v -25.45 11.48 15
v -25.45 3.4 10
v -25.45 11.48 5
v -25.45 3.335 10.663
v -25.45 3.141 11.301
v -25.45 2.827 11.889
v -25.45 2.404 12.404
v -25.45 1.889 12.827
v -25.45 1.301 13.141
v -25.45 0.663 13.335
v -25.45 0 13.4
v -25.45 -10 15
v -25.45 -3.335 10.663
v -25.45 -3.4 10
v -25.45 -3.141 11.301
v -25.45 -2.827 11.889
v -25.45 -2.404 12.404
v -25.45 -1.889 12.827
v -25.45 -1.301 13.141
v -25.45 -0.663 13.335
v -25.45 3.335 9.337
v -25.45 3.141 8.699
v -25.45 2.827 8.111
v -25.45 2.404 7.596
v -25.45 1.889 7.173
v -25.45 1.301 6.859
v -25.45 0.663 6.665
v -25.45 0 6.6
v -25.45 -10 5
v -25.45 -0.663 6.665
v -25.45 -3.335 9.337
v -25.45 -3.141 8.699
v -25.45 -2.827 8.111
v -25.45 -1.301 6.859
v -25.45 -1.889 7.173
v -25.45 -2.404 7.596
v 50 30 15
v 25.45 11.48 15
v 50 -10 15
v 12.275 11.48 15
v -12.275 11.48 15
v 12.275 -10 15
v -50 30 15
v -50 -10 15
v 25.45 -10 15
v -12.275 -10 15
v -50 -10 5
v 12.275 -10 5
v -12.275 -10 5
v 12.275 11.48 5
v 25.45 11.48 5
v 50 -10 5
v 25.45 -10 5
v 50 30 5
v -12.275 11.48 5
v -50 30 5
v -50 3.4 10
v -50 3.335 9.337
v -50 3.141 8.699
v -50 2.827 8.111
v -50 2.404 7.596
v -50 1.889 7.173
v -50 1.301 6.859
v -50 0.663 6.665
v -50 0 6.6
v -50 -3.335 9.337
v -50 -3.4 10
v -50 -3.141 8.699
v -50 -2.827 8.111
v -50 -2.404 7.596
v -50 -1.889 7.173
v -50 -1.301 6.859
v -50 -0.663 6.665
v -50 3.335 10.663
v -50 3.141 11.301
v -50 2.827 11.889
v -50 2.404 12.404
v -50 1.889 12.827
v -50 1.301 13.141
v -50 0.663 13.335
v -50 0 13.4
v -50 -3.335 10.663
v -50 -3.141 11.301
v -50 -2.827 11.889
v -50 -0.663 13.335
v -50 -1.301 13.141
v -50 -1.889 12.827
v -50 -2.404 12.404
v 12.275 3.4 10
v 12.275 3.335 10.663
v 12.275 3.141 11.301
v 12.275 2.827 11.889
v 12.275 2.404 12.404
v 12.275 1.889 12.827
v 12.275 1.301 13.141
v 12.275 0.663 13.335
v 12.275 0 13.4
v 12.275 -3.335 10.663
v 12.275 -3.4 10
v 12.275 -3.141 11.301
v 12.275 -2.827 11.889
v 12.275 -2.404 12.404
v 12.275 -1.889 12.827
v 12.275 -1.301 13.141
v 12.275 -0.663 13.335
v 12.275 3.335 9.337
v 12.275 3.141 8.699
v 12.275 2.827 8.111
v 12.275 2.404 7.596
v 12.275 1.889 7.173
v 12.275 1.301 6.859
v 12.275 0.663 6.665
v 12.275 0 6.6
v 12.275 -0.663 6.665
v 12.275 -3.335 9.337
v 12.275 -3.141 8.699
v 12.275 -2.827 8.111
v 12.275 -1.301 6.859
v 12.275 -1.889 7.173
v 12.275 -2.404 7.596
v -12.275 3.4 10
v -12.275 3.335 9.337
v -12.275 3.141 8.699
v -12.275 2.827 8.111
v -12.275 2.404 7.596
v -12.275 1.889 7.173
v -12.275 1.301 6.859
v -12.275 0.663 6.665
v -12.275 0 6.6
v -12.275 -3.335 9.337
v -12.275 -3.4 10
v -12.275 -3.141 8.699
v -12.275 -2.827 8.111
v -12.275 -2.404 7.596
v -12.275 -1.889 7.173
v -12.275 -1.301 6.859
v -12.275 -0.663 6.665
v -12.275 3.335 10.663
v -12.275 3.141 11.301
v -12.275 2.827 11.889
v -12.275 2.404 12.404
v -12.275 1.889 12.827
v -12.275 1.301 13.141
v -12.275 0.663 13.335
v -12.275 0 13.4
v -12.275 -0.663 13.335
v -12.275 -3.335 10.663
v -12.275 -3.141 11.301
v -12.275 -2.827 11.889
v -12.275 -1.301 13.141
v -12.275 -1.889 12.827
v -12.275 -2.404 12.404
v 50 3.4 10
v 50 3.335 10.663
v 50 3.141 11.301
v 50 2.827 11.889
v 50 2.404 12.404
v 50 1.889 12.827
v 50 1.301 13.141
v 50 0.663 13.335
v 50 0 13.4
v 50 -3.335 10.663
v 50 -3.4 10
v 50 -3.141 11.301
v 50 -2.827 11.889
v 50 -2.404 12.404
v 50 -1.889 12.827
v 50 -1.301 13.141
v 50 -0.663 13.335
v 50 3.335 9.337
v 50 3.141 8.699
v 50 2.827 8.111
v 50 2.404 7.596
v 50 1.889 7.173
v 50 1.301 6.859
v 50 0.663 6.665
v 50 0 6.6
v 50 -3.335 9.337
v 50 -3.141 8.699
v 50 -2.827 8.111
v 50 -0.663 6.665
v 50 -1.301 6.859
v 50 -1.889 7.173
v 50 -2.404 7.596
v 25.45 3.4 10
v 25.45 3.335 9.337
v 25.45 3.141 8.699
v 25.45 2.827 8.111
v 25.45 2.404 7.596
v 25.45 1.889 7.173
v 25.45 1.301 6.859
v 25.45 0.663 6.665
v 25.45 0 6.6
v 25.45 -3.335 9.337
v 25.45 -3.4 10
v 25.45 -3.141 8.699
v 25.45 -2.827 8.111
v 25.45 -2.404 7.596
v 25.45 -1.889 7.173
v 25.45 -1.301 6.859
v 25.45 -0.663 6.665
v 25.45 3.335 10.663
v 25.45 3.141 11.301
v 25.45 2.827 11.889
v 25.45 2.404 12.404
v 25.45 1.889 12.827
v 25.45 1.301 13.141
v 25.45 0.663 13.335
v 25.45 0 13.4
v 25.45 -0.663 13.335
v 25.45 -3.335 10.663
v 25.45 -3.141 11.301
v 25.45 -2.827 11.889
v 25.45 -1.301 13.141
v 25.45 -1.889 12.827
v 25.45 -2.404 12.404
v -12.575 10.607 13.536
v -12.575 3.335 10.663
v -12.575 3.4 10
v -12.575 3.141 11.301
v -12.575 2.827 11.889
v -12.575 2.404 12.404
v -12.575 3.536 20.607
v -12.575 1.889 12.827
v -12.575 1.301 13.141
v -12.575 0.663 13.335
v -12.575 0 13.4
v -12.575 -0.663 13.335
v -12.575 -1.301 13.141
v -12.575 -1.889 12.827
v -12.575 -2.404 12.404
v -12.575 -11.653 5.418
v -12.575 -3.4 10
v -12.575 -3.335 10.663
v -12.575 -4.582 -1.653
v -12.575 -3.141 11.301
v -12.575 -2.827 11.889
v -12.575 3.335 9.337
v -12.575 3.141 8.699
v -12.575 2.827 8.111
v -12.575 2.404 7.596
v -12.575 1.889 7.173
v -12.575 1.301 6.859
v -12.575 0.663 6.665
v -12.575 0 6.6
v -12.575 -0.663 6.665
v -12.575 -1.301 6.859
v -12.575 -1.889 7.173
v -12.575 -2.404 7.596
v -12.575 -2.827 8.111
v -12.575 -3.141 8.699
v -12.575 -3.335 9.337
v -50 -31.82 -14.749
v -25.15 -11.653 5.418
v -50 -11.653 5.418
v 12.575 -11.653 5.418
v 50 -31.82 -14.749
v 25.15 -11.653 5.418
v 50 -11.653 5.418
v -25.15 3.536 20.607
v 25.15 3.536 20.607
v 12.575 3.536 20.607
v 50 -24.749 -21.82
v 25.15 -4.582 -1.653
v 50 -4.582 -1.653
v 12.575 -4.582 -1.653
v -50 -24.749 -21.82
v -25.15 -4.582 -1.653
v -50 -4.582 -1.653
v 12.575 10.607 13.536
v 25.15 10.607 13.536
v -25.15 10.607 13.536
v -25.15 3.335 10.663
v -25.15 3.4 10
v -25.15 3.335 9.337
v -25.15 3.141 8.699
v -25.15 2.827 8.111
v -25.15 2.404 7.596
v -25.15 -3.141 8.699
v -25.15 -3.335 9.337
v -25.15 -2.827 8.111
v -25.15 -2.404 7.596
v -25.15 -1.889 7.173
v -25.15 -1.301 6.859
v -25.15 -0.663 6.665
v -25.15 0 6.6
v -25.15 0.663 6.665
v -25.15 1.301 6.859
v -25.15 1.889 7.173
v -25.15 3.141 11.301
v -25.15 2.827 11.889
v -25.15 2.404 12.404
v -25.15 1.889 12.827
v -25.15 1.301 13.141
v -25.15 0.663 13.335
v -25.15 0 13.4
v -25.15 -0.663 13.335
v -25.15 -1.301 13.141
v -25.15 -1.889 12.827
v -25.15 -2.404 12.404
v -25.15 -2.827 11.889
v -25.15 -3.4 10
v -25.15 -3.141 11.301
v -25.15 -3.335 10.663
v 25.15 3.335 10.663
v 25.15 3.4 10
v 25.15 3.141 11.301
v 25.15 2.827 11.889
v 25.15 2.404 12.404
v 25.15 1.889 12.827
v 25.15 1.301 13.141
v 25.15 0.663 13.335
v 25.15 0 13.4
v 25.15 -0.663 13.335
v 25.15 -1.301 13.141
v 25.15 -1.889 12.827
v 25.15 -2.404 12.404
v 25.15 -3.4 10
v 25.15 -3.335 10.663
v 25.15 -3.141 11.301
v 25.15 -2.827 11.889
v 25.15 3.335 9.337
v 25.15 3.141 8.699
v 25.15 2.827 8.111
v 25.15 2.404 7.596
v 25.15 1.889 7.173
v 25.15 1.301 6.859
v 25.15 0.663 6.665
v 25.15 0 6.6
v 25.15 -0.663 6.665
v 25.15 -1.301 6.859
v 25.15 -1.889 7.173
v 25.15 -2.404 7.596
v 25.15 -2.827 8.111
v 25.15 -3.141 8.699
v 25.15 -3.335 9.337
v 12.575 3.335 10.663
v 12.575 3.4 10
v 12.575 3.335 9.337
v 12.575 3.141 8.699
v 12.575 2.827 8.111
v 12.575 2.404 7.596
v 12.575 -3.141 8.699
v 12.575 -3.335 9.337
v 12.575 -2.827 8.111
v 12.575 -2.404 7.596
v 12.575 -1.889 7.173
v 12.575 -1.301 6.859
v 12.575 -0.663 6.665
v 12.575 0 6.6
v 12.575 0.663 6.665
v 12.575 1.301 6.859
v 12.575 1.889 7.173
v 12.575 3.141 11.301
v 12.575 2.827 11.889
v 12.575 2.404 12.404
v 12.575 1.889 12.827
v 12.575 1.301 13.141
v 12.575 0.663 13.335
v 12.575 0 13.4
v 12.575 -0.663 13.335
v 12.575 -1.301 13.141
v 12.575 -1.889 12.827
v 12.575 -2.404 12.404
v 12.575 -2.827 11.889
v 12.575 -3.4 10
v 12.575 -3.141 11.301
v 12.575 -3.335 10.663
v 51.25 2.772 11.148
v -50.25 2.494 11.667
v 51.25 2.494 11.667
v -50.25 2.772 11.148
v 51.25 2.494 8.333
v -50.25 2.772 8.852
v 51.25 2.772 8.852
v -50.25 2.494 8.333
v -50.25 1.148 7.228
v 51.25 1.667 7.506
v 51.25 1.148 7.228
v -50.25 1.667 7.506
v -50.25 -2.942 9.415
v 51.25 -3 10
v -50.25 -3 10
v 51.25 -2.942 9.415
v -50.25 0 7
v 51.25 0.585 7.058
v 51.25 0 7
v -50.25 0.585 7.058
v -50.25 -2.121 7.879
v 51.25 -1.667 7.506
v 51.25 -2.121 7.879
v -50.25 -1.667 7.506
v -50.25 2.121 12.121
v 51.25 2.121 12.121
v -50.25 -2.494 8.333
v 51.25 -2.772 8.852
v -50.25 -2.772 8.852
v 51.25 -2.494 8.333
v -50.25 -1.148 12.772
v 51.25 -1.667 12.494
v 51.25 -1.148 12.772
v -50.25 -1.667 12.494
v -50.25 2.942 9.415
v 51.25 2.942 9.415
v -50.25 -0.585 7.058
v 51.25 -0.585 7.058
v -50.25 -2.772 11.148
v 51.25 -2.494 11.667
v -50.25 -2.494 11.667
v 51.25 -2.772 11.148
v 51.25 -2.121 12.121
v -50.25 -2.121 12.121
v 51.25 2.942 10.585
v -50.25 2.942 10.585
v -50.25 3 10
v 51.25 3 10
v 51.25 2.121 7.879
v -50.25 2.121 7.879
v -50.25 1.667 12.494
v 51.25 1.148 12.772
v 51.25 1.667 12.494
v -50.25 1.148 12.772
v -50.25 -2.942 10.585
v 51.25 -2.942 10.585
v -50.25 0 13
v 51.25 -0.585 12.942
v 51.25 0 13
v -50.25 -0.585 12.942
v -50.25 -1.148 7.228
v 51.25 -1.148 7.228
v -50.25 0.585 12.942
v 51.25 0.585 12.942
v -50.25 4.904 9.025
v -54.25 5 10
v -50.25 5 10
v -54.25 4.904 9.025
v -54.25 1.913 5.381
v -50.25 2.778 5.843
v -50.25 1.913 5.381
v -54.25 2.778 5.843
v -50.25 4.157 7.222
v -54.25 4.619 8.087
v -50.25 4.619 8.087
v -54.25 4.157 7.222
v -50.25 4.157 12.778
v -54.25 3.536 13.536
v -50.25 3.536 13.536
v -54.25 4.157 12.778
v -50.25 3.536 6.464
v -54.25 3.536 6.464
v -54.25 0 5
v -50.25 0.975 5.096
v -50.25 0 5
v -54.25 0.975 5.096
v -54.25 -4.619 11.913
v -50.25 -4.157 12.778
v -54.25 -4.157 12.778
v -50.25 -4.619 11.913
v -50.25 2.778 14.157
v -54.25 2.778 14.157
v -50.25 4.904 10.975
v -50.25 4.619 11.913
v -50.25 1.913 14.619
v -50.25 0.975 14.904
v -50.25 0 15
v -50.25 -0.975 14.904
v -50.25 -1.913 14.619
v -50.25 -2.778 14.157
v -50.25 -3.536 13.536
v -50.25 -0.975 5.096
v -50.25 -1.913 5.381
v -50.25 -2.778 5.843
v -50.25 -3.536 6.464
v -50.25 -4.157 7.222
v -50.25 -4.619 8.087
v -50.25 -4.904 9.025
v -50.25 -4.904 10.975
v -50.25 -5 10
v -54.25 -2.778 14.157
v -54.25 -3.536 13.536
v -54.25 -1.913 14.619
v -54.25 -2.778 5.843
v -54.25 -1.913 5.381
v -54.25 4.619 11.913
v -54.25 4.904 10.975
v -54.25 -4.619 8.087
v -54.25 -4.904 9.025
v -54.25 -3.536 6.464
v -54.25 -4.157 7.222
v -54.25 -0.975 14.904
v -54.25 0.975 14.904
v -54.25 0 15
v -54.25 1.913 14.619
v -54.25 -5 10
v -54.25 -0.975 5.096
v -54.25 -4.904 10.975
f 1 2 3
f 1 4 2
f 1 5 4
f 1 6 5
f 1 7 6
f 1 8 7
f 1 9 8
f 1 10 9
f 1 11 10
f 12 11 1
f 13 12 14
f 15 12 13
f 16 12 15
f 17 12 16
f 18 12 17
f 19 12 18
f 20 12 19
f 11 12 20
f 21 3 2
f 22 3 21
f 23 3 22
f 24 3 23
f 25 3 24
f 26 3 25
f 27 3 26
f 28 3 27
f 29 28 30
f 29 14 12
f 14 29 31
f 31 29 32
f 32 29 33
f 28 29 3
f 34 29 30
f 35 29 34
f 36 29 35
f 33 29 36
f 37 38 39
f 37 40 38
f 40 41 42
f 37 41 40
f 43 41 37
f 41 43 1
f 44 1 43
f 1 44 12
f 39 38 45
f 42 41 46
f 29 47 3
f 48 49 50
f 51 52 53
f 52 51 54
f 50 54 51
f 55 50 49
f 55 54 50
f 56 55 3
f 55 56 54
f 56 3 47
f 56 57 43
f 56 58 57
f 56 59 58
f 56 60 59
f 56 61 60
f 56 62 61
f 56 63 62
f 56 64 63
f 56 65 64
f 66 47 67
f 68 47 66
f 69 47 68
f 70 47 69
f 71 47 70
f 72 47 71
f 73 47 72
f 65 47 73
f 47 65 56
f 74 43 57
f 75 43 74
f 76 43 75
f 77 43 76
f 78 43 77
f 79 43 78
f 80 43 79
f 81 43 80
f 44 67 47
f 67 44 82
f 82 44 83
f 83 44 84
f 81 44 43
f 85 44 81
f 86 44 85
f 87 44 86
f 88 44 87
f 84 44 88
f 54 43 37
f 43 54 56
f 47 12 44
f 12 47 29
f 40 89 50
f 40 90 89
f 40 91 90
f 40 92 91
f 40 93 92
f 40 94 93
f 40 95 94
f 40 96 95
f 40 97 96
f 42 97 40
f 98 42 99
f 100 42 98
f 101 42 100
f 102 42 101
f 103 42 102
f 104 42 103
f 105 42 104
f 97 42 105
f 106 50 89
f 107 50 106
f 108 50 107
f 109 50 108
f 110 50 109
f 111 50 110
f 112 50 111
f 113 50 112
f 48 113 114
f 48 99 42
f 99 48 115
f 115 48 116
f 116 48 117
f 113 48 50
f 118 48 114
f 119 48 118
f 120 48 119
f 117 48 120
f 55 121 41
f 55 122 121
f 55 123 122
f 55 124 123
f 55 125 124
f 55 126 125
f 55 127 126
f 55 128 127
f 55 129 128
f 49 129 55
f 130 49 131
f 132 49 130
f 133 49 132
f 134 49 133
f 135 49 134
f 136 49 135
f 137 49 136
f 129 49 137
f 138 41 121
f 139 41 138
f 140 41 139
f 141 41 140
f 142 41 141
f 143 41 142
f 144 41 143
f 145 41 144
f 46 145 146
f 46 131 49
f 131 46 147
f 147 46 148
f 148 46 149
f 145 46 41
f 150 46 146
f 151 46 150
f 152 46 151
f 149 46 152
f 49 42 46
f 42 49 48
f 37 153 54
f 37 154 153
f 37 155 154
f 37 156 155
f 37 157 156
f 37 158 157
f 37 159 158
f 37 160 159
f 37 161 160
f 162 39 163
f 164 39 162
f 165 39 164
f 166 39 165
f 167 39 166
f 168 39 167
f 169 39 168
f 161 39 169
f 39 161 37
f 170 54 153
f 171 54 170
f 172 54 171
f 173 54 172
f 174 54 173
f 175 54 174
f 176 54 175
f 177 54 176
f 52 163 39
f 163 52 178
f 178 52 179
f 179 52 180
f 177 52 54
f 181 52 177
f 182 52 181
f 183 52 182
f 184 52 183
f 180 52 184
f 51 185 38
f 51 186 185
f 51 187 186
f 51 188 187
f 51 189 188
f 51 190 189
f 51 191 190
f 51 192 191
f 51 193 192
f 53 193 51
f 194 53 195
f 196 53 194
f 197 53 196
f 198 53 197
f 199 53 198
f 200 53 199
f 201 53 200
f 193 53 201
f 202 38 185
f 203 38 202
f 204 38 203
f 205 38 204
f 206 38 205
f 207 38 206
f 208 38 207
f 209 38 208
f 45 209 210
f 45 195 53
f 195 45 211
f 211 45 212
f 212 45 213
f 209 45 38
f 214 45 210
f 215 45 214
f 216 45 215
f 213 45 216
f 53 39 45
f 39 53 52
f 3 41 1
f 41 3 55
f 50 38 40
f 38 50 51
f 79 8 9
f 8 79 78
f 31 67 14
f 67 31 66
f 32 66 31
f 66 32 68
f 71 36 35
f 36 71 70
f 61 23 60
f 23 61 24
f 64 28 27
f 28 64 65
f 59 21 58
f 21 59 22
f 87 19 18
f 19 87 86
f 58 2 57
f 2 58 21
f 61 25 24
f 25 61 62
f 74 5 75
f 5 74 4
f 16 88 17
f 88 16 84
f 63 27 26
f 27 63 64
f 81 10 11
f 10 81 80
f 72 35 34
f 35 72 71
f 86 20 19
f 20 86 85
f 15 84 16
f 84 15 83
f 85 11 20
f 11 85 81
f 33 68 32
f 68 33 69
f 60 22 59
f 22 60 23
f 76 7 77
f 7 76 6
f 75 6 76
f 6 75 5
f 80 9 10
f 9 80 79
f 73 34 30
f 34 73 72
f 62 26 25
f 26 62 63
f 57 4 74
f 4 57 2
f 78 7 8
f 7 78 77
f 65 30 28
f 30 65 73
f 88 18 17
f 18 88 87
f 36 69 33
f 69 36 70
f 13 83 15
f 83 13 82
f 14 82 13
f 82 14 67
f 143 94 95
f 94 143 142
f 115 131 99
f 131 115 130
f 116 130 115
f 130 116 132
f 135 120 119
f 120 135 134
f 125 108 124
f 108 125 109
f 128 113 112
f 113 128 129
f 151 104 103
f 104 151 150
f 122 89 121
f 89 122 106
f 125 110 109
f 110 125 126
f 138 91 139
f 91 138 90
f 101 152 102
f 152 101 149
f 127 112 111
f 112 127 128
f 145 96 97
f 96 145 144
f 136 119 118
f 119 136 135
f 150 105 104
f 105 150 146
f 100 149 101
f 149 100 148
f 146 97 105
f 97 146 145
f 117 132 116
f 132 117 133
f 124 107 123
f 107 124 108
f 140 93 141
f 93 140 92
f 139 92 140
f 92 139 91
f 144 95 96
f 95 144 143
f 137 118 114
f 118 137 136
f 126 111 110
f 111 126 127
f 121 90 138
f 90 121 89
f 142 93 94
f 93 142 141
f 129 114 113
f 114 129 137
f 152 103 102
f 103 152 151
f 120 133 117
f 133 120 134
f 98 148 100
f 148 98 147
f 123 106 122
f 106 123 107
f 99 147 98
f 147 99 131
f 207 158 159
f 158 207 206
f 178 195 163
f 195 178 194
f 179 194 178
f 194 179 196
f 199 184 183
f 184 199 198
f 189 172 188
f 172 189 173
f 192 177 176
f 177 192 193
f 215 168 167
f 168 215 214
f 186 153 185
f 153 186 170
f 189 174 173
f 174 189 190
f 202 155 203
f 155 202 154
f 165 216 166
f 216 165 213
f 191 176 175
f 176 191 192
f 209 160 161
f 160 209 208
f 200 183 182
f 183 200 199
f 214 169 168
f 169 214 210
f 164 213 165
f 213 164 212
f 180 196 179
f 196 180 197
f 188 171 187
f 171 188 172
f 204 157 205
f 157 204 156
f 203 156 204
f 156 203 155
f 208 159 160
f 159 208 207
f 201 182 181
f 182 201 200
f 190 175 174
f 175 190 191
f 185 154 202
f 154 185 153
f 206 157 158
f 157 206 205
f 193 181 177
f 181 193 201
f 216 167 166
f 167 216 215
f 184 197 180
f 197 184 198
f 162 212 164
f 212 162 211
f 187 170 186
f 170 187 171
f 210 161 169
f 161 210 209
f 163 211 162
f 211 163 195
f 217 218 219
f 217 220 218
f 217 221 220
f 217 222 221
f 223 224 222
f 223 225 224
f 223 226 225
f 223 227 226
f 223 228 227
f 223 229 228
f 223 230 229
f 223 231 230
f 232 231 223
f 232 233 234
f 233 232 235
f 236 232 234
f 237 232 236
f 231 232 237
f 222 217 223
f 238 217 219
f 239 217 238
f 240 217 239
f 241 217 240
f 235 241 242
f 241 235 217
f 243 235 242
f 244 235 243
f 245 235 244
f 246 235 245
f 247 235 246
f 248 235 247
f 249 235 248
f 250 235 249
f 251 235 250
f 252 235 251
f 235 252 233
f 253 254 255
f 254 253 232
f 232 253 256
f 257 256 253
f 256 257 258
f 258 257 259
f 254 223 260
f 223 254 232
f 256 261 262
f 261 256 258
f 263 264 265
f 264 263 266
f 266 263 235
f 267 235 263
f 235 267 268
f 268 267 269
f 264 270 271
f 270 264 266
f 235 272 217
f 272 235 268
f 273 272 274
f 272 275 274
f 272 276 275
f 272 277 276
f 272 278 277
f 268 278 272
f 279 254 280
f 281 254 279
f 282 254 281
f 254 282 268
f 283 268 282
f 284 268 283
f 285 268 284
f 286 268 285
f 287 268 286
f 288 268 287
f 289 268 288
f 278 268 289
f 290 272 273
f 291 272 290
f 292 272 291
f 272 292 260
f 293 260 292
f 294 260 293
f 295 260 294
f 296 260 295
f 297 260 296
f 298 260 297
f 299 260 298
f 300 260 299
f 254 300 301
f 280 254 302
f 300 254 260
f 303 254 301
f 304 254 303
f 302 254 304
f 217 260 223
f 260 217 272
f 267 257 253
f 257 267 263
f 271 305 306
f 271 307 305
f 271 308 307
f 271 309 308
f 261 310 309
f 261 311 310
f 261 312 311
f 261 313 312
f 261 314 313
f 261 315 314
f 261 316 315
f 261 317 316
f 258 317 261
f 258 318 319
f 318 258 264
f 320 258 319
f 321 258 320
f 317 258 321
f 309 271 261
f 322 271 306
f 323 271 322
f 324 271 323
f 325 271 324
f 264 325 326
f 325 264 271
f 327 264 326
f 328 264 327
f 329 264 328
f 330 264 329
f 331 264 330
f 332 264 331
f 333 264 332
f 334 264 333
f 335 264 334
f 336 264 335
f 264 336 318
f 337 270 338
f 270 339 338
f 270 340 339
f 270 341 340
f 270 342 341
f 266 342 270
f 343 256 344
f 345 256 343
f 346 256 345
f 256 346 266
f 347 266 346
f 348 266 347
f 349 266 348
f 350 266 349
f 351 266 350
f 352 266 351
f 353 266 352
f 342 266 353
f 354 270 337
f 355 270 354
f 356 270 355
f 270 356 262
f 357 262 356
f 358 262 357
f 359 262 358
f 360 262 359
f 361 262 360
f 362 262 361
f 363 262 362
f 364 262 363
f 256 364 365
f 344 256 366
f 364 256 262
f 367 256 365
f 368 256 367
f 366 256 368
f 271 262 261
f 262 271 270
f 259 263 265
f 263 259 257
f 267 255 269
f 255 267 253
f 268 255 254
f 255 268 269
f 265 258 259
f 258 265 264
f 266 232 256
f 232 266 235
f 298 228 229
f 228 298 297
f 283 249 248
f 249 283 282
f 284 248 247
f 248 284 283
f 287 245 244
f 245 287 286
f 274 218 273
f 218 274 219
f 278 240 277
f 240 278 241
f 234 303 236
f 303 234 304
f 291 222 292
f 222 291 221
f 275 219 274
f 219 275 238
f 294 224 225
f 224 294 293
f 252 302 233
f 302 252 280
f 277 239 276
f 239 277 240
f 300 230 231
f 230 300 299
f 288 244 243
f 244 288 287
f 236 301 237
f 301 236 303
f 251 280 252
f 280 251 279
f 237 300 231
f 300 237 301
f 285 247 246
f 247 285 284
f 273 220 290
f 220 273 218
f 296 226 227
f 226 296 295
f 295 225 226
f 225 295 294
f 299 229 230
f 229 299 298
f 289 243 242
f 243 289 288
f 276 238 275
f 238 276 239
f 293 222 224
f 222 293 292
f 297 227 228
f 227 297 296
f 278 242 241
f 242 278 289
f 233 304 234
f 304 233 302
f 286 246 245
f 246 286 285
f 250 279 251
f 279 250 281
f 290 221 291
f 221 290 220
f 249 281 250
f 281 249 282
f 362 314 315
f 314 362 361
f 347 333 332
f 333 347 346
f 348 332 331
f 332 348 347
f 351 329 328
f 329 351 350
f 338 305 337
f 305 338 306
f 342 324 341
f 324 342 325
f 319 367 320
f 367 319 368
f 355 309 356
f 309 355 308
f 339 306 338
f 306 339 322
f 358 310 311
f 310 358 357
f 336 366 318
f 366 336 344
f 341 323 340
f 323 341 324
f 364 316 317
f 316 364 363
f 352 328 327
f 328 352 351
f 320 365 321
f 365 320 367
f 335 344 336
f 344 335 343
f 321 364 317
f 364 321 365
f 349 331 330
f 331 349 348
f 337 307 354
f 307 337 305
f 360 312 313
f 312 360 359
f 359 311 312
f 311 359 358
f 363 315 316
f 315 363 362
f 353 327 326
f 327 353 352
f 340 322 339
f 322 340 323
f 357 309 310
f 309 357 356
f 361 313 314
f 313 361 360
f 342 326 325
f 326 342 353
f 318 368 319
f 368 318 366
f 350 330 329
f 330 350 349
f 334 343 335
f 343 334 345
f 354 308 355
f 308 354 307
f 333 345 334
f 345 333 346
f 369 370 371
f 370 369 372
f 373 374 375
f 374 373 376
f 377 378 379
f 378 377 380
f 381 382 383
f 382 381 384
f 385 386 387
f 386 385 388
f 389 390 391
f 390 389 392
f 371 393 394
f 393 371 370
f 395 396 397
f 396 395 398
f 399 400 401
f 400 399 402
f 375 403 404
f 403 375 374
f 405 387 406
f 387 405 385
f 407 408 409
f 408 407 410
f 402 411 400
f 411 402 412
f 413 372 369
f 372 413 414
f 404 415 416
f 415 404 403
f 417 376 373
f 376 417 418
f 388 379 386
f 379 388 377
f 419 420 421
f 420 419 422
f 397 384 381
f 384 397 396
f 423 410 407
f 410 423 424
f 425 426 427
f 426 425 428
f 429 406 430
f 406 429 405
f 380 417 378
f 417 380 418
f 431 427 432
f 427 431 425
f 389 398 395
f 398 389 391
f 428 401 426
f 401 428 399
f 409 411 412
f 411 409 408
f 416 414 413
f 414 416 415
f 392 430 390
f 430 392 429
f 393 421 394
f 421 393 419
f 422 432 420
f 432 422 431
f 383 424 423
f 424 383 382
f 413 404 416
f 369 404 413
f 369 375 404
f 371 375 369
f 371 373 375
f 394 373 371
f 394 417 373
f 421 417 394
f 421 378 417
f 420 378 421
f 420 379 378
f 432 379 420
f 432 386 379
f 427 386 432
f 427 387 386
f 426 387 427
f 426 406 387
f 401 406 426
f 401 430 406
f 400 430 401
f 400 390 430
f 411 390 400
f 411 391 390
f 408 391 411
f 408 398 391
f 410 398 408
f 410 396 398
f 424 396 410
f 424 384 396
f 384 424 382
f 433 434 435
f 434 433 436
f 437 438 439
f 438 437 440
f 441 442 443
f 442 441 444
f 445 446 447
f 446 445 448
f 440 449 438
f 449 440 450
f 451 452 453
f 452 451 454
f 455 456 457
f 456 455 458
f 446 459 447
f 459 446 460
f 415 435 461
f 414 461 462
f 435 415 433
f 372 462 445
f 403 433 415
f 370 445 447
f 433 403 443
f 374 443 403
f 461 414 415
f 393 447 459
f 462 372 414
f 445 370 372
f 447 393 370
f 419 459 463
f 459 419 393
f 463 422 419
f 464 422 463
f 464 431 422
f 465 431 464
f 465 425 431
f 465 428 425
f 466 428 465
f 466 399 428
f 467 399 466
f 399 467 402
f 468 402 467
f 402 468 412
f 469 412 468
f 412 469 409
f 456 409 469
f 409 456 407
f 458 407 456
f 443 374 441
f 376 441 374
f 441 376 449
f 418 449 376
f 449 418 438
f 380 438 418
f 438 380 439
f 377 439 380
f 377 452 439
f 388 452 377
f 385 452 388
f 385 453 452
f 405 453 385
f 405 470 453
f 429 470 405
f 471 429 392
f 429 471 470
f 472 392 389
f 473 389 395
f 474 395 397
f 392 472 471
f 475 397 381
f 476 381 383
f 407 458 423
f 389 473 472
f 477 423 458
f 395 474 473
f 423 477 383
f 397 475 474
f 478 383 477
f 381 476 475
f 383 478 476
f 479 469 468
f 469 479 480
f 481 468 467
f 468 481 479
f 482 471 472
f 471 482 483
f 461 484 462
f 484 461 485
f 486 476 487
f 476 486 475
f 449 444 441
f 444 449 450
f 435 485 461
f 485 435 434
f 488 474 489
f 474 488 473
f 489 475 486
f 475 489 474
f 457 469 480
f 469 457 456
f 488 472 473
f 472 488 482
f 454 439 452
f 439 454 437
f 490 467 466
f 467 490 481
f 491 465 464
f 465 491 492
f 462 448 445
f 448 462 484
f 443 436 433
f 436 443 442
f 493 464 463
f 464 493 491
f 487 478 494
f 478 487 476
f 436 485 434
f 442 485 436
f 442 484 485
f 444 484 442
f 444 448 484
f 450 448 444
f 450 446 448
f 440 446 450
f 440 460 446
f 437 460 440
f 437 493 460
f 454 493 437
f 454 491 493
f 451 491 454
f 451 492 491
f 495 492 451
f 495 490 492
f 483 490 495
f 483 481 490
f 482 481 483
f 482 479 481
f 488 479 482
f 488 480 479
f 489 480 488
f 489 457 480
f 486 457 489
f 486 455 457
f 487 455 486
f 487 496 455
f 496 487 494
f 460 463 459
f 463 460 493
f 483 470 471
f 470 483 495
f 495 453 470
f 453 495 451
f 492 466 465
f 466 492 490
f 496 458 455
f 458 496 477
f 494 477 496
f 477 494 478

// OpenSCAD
$fn = 32;

// ------------------------------------------------------------------------
// Butt hinge: hinge 100 mm, leaf swung 45 deg
// Every part is its own module, assembly() places every instance.
// ------------------------------------------------------------------------

// --- part 1 ---
module hinge_base() {
  difference() {
    union() {
      translate([-50, -10, -5]) cube([24.55, 40, 10]);
      translate([-12.275, -10, -5]) cube([24.55, 40, 10]);
      translate([25.45, -10, -5]) cube([24.55, 40, 10]);
      translate([-50, 11.48, -5]) cube([100, 18.52, 10]);
    }
    translate([-37.725, 0, 0]) rotate([0, 90, 0]) cylinder(h = 26.55, d = 6.8, center = true);
    translate([0, 0, 0]) rotate([0, 90, 0]) cylinder(h = 26.55, d = 6.8, center = true);
    translate([37.725, 0, 0]) rotate([0, 90, 0]) cylinder(h = 26.55, d = 6.8, center = true);
  }
}

// --- part 2 ---
module hinge_mover() {
  difference() {
    union() {
      translate([-25.15, -40, -5]) cube([12.575, 50, 10]);
      translate([12.575, -40, -5]) cube([12.575, 50, 10]);
      translate([-50, -40, -5]) cube([100, 28.52, 10]);
    }
    translate([-18.863, 0, 0]) rotate([0, 90, 0]) cylinder(h = 14.575, d = 6.8, center = true);
    translate([18.863, 0, 0]) rotate([0, 90, 0]) cylinder(h = 14.575, d = 6.8, center = true);
  }
}

// --- part 3 ---
module hinge_pin() {
  rotate([0, 90, 0]) cylinder(h = 102.5, d = 6, center = true);
  translate([-54.25, 0, 0]) rotate([0, 90, 0]) cylinder(h = 4, d = 10);
}

// --- assembly ---
module assembly() {
  color([0.80, 0.24, 0.20]) translate([0, 0, 10]) rotate([0, 0, 0]) hinge_base();
  color([0.20, 0.45, 0.75]) translate([0, 0, 10]) rotate([45, 0, 0]) hinge_mover();
  color([0.25, 0.62, 0.32]) translate([0, 0, 10]) rotate([0, 0, 0]) hinge_pin();
}

assembly();
